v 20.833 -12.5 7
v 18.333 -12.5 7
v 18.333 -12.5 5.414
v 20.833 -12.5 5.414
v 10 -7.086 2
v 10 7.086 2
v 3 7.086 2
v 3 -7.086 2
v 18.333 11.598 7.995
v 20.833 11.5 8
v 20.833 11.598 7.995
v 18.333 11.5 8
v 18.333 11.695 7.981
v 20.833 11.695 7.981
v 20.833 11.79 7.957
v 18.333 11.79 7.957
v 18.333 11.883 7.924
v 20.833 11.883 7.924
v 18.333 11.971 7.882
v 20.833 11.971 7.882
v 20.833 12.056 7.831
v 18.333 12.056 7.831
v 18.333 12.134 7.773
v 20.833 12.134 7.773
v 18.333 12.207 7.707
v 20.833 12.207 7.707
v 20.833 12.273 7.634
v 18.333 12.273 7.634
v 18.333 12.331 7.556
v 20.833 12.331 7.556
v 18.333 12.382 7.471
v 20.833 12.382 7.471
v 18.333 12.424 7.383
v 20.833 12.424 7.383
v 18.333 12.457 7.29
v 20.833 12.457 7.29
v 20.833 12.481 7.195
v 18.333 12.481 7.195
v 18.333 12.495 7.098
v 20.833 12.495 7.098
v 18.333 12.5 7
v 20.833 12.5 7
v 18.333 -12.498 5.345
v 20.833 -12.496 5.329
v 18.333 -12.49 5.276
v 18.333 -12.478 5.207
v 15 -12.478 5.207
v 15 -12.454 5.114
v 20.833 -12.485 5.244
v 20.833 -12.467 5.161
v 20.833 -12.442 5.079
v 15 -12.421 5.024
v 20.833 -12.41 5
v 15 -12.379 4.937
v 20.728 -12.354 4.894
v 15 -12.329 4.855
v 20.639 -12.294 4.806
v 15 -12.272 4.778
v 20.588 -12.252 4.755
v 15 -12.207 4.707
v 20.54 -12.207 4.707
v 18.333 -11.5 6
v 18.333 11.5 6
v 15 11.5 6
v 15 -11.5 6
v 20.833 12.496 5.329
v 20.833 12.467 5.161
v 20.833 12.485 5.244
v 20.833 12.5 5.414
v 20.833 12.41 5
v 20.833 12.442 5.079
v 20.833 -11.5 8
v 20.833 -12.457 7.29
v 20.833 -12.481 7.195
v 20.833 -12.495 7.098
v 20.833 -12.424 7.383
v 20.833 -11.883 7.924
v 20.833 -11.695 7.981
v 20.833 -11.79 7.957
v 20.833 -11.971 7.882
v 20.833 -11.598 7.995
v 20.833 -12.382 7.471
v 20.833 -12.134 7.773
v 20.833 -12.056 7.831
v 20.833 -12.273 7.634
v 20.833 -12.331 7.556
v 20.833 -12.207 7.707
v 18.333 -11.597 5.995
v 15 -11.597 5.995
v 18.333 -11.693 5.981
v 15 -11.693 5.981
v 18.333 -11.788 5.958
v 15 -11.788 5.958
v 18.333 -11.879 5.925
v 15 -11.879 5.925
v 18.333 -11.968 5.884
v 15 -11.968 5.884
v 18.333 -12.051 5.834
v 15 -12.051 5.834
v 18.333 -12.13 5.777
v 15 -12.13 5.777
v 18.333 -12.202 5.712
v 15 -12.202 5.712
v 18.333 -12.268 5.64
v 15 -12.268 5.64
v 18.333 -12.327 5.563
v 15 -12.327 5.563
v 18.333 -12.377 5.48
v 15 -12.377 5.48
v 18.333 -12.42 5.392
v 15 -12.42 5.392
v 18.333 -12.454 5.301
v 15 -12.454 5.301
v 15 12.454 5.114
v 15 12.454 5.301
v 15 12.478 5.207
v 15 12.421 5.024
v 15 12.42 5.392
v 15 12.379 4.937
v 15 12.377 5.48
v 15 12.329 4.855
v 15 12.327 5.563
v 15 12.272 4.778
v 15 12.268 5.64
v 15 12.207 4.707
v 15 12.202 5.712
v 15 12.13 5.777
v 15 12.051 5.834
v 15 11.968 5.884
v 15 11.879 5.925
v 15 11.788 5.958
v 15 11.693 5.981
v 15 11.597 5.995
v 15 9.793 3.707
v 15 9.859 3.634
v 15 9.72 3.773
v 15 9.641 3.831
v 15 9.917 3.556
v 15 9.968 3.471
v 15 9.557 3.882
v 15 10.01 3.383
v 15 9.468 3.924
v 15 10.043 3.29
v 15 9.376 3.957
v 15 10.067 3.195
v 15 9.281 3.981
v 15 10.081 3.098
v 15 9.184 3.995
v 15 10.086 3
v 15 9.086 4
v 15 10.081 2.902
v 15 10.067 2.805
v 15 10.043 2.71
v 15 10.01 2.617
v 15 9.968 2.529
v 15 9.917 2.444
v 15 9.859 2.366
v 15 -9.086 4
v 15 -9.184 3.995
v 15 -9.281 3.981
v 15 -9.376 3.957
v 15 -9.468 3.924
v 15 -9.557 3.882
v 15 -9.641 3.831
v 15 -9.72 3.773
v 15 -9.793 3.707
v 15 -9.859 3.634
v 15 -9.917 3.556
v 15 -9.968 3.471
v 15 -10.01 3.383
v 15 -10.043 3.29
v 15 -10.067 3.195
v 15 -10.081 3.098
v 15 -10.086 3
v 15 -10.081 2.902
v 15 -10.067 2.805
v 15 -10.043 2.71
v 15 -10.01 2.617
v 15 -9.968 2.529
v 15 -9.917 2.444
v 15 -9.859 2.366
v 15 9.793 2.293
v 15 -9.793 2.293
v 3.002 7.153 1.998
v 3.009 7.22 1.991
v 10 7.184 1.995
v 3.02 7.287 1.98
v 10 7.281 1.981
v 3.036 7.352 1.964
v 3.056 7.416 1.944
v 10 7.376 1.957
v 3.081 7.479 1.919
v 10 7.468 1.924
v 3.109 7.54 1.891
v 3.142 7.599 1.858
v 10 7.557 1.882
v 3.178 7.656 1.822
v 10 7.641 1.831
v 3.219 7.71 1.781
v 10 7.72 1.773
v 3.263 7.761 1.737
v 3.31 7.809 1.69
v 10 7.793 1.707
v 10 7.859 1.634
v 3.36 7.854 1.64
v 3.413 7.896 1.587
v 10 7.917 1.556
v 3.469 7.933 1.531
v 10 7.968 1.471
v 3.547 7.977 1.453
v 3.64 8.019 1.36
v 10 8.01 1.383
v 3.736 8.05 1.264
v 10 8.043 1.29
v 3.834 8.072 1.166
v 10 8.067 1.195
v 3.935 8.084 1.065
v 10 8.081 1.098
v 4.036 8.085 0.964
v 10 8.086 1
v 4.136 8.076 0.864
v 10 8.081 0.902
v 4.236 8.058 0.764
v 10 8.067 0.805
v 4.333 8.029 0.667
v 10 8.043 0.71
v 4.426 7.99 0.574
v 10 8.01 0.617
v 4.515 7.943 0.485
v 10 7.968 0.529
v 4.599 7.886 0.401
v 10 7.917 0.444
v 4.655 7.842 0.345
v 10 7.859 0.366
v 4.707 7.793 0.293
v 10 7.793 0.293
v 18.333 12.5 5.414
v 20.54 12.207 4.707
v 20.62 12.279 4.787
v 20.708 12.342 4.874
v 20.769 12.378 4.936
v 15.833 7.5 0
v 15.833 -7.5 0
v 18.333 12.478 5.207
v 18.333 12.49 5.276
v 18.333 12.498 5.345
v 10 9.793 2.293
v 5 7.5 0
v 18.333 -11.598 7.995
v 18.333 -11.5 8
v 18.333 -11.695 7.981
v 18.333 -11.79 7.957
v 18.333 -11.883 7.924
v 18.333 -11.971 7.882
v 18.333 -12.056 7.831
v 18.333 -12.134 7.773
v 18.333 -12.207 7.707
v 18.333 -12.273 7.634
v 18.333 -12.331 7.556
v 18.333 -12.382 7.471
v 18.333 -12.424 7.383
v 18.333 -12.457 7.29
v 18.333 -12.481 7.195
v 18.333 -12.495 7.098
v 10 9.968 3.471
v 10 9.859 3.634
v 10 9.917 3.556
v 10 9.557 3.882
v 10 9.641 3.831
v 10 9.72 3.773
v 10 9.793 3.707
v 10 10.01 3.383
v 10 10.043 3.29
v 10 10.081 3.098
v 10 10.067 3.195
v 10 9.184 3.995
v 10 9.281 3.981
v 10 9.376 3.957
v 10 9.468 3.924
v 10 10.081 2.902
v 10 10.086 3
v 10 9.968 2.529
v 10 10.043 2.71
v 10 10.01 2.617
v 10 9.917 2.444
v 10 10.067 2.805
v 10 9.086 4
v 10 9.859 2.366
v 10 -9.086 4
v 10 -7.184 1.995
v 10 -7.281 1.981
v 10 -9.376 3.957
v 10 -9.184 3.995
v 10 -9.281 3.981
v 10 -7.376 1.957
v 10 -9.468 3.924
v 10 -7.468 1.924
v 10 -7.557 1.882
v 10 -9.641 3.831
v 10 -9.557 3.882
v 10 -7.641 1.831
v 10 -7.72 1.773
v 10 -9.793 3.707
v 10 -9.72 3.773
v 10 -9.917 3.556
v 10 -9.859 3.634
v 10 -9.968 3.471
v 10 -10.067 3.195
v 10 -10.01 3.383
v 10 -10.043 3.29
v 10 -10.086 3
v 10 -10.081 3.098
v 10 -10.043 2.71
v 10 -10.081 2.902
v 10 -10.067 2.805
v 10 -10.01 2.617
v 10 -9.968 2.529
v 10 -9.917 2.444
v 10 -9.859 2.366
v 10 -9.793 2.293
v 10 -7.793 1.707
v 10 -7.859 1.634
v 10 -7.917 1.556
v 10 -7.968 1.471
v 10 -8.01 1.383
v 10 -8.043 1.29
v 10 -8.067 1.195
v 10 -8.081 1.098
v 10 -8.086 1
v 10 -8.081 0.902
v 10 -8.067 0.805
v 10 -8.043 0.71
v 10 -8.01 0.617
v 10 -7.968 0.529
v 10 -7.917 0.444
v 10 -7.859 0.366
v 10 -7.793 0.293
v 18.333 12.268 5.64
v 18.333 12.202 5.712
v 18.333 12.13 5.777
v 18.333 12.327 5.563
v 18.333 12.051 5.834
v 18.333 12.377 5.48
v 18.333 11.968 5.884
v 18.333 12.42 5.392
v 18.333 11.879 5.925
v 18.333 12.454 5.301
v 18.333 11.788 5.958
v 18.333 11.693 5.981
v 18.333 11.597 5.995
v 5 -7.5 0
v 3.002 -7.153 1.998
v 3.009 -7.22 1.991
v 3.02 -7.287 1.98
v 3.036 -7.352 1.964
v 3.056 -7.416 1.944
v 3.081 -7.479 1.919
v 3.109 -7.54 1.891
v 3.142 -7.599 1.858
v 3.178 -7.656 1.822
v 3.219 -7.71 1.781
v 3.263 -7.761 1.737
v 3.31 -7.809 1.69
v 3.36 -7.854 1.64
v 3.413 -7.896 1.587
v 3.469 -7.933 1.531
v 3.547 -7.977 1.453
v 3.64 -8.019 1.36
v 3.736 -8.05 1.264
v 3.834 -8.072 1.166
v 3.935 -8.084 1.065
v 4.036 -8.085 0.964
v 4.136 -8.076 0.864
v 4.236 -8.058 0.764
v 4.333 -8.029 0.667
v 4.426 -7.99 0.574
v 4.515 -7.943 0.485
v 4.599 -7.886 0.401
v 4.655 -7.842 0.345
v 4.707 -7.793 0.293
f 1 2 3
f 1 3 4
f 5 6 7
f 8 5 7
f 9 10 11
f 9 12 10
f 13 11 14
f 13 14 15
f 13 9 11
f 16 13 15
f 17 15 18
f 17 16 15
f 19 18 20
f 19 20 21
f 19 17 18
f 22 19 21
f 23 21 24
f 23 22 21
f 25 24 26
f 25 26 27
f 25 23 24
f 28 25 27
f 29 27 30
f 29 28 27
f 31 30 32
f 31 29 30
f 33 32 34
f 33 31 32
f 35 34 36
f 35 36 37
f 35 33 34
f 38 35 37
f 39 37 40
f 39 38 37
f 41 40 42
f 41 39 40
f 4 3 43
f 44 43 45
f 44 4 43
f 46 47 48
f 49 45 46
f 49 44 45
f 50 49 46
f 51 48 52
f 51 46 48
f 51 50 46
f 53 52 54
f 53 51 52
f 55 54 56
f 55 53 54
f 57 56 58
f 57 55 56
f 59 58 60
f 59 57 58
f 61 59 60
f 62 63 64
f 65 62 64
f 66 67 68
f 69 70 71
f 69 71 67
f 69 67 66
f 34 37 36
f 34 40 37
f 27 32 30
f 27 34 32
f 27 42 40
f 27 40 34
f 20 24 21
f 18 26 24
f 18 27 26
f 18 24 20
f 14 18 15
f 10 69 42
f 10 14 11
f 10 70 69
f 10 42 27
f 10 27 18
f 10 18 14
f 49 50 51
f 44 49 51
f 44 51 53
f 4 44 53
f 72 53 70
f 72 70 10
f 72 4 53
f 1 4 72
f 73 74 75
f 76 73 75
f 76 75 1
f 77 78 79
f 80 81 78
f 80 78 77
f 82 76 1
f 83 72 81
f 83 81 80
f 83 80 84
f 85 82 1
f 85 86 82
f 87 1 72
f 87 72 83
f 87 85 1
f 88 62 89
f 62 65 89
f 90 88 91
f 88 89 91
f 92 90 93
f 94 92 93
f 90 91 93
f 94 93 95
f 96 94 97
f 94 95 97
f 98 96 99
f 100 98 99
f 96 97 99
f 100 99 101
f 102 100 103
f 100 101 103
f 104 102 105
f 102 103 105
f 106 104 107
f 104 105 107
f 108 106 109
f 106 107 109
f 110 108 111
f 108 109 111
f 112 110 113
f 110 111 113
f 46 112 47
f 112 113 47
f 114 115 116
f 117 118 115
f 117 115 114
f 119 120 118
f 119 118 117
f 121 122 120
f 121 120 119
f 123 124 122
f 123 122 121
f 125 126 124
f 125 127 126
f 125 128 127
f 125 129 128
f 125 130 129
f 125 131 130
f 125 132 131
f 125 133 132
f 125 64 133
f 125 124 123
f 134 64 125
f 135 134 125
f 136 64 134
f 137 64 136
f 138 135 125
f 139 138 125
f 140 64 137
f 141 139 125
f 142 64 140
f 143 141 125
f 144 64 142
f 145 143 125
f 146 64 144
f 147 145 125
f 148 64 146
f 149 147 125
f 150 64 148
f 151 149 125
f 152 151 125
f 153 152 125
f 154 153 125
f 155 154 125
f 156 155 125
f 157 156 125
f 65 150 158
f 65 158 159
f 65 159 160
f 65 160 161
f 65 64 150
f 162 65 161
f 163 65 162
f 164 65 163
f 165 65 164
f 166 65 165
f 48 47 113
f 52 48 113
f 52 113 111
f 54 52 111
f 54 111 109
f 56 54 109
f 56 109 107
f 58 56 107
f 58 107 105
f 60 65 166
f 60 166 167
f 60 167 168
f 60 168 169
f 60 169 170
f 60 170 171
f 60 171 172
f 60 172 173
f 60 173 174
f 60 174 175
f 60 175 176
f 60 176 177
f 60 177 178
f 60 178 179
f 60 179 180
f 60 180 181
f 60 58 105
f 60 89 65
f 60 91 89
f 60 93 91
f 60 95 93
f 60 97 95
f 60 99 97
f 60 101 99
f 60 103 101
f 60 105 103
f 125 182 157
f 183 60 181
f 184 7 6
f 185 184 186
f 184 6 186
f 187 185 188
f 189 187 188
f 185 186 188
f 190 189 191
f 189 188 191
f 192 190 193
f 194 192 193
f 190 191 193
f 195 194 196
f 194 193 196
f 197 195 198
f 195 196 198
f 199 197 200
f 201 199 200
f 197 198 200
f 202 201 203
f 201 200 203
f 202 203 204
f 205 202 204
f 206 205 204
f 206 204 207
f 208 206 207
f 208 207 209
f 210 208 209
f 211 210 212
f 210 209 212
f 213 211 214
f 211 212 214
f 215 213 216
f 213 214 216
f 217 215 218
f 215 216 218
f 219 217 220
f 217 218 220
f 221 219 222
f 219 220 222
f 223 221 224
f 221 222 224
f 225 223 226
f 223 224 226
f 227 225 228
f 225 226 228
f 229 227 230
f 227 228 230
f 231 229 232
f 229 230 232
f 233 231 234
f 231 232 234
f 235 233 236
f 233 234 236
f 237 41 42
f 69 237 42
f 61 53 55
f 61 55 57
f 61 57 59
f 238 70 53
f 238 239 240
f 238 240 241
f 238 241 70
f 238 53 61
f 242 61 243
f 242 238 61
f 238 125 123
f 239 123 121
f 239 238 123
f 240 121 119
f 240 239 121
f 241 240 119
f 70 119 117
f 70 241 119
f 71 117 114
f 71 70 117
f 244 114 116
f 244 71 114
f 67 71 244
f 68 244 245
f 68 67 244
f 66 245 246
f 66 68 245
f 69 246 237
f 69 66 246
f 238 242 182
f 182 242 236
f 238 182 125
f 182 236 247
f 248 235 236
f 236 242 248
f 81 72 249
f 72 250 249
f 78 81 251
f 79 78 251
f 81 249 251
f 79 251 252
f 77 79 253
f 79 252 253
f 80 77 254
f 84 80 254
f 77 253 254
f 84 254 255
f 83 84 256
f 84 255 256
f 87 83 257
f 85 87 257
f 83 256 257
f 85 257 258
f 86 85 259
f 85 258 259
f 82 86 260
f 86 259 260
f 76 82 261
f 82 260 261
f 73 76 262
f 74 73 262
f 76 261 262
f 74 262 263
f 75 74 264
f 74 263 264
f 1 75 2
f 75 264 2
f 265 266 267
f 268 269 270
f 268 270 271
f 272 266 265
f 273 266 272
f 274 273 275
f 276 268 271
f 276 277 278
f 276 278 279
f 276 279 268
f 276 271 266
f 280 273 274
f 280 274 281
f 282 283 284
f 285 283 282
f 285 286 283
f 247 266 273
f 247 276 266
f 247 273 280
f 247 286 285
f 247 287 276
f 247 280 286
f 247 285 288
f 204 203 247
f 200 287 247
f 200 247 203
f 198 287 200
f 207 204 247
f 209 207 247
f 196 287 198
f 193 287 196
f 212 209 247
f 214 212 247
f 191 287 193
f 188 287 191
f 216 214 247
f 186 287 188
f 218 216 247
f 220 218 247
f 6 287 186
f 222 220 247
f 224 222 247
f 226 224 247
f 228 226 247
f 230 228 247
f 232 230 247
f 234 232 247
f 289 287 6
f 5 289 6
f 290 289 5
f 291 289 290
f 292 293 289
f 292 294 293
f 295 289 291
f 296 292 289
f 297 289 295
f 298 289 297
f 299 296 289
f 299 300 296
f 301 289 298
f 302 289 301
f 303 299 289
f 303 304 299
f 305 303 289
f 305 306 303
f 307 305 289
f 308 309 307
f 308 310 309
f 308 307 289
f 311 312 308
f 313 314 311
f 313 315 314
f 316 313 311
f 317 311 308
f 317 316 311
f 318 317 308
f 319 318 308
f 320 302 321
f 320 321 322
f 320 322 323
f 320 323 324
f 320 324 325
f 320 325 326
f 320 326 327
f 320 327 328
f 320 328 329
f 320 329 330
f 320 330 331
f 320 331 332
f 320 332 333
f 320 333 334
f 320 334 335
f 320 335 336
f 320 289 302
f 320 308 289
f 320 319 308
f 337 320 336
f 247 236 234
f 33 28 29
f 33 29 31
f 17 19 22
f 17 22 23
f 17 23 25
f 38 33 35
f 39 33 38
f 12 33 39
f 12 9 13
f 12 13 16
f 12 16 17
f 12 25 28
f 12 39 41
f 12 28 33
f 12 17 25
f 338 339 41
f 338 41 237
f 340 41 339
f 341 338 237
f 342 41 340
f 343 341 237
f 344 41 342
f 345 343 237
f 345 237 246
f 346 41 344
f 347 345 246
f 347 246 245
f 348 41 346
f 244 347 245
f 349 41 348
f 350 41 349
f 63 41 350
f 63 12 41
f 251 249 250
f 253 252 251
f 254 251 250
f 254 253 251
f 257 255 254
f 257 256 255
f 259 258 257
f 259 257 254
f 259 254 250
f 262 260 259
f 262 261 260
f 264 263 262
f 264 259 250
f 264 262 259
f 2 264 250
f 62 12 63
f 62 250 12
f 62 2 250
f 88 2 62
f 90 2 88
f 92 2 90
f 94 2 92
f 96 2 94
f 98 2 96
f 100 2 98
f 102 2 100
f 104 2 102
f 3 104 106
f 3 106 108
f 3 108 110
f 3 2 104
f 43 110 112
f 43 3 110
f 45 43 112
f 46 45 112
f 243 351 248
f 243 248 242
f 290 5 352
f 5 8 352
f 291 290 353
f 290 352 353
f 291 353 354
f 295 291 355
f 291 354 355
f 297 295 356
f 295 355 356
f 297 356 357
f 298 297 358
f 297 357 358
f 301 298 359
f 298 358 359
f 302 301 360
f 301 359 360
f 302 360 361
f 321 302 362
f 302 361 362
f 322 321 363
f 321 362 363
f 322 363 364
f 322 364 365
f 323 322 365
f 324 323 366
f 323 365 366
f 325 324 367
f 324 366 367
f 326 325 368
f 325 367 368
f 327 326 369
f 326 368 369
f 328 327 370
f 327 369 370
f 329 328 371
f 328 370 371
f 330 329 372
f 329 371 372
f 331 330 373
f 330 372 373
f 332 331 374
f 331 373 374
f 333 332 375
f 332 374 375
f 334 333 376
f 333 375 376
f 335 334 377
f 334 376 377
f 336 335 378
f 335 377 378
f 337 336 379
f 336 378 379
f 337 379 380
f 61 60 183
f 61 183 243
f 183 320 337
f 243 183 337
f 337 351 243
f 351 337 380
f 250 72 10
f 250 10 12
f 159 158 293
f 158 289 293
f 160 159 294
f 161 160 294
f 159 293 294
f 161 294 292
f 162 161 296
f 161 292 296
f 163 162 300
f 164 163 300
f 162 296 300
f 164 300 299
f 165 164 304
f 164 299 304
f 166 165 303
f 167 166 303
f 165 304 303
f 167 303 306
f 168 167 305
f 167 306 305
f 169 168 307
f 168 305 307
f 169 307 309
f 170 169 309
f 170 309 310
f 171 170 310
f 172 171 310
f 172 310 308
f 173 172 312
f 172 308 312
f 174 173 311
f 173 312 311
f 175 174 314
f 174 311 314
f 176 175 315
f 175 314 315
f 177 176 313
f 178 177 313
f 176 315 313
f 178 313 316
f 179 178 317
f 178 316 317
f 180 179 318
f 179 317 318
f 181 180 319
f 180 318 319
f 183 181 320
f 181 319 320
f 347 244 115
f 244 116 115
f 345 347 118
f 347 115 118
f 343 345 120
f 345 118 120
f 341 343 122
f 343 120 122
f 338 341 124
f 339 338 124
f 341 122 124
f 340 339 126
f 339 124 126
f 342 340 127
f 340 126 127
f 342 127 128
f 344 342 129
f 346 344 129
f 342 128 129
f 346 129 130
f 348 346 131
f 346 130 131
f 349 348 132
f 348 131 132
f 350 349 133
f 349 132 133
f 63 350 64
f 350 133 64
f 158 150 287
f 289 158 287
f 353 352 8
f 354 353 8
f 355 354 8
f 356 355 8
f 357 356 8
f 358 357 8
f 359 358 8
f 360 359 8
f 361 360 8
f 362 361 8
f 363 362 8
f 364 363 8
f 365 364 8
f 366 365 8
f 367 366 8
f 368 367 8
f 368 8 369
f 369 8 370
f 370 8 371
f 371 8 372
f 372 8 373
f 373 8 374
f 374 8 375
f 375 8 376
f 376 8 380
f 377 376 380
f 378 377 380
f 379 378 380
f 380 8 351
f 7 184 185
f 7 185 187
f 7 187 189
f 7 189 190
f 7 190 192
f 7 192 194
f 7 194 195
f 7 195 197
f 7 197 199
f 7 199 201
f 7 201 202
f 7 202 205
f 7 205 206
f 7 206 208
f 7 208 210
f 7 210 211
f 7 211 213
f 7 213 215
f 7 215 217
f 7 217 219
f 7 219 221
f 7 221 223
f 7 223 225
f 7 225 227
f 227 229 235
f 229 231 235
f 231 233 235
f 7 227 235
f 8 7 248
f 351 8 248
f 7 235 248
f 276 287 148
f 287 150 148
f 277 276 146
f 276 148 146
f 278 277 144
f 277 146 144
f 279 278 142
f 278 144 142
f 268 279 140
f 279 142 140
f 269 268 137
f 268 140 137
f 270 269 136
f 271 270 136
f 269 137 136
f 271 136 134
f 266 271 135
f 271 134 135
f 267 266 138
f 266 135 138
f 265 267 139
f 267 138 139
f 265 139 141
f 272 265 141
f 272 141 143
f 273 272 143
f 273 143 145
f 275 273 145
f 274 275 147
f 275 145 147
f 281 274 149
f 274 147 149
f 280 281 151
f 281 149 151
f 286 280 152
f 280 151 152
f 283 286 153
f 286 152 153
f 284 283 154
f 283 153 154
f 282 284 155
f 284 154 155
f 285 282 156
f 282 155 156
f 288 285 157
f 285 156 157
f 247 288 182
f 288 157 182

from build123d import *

# Parameters (mm, degrees)
F2_DEPTH    = 12.5
F3_T1_DEPTH = 46.550163213
F3_T3_DEPTH = 50.7168298797
F4_R        = 1
F4_R_2      = 0.99999


# Not quite as in the source:
# - a fillet or chamfer that OpenCascade refuses, or shapes differently, is made with other operations: its cross-section is extruded or revolved along the edge and cut away or added
# - a fillet or chamfer is up to 0.001 mm smaller than in the source, because OpenCascade refuses the exact size


with BuildPart() as f2:
    # F1 (on Front) → F2 (new body, symmetric)
    with BuildSketch(Plane.XZ):
        Polygon((0, 2), (0, 0), (20.8333333333, 0), (20.8333333333, 8), (18.3333333333, 8), (18.3333333333, 6), (15, 6), (15, 4), (10, 4), (10, 2), align=None)
    extrude(amount=F2_DEPTH, both=True)

    # F3: chamfer of 5 on 4 edges, made by hand

    # F3_s2 → F3_t1 (cut)
    with BuildSketch(Plane.YZ.offset(-12.8584149398)):
        Polygon((-12.5, 5), (-7.5, 0), (-12.5, 0), align=None)
        Polygon((7.5, 0), (12.5, 5), (12.5, 0), align=None)
    extrude(amount=F3_T1_DEPTH, mode=Mode.SUBTRACT)

    # F3_s4 → F3_t3 (cut)
    with BuildSketch(Plane.XZ.offset(-25.3584149398)):
        Polygon((0, 5), (5, 0), (0, 0), align=None)
        Polygon((20.8333333333, 5), (15.8333333333, 0), (20.8333333333, 0), align=None)
    extrude(amount=F3_T3_DEPTH, mode=Mode.SUBTRACT)

    # F4 (call 1 of 10: OpenCascade refuses the feature's edges together)
    f4_edges = [f2.edges().sort_by_distance(p)[0] for p in [
        (6.5, -9.5, 2),
    ]]
    fillet(f4_edges, radius=F4_R)

    # F4#2 (call 2 of 10)
    f4_2_edges = [f2.edges().sort_by_distance(p)[0] for p in [
        (12.5, -11.5, 4),
    ]]
    fillet(f4_2_edges, radius=F4_R)

    # F4#3 (call 3 of 10) (radius 1 in the source; OpenCascade refuses exactly that, so slightly less here)
    f4_3_edges = [f2.edges().sort_by_distance(p)[0] for p in [
        (16.666667, -12.5, 6),
    ]]
    fillet(f4_3_edges, radius=F4_R_2)

    # F4#4 (call 4 of 10)
    f4_4_edges = [f2.edges().sort_by_distance(p)[0] for p in [
        (19.583333, -12.5, 8),
    ]]
    fillet(f4_4_edges, radius=F4_R)

    # F4#5 (call 5 of 10)
    f4_5_edges = [f2.edges().sort_by_distance(p)[0] for p in [
        (19.583333, 12.5, 8),
    ]]
    fillet(f4_5_edges, radius=F4_R)

    # F4#6 (call 6 of 10) (radius 1 in the source; OpenCascade refuses exactly that, so slightly less here)
    f4_6_edges = [f2.edges().sort_by_distance(p)[0] for p in [
        (16.666667, 12.5, 6),
    ]]
    fillet(f4_6_edges, radius=F4_R_2)

    # F4#7 (call 7 of 10)
    f4_7_edges = [f2.edges().sort_by_distance(p)[0] for p in [
        (12.5, 11.5, 4),
    ]]
    fillet(f4_7_edges, radius=F4_R)

    # F4#8 (call 8 of 10)
    f4_8_edges = [f2.edges().sort_by_distance(p)[0] for p in [
        (6.5, 9.5, 2),
    ]]
    fillet(f4_8_edges, radius=F4_R)

    # F4#9 (call 9 of 10)
    f4_9_edges = [f2.edges().sort_by_distance(p)[0] for p in [
        (17.916667, -12.5, 5),
    ]]
    fillet(f4_9_edges, radius=F4_R)

    # F4#10 (call 10 of 10)
    f4_10_edges = [f2.edges().sort_by_distance(p)[0] for p in [
        (17.916667, 12.5, 5),
    ]]
    fillet(f4_10_edges, radius=F4_R)


solid = f2.part
